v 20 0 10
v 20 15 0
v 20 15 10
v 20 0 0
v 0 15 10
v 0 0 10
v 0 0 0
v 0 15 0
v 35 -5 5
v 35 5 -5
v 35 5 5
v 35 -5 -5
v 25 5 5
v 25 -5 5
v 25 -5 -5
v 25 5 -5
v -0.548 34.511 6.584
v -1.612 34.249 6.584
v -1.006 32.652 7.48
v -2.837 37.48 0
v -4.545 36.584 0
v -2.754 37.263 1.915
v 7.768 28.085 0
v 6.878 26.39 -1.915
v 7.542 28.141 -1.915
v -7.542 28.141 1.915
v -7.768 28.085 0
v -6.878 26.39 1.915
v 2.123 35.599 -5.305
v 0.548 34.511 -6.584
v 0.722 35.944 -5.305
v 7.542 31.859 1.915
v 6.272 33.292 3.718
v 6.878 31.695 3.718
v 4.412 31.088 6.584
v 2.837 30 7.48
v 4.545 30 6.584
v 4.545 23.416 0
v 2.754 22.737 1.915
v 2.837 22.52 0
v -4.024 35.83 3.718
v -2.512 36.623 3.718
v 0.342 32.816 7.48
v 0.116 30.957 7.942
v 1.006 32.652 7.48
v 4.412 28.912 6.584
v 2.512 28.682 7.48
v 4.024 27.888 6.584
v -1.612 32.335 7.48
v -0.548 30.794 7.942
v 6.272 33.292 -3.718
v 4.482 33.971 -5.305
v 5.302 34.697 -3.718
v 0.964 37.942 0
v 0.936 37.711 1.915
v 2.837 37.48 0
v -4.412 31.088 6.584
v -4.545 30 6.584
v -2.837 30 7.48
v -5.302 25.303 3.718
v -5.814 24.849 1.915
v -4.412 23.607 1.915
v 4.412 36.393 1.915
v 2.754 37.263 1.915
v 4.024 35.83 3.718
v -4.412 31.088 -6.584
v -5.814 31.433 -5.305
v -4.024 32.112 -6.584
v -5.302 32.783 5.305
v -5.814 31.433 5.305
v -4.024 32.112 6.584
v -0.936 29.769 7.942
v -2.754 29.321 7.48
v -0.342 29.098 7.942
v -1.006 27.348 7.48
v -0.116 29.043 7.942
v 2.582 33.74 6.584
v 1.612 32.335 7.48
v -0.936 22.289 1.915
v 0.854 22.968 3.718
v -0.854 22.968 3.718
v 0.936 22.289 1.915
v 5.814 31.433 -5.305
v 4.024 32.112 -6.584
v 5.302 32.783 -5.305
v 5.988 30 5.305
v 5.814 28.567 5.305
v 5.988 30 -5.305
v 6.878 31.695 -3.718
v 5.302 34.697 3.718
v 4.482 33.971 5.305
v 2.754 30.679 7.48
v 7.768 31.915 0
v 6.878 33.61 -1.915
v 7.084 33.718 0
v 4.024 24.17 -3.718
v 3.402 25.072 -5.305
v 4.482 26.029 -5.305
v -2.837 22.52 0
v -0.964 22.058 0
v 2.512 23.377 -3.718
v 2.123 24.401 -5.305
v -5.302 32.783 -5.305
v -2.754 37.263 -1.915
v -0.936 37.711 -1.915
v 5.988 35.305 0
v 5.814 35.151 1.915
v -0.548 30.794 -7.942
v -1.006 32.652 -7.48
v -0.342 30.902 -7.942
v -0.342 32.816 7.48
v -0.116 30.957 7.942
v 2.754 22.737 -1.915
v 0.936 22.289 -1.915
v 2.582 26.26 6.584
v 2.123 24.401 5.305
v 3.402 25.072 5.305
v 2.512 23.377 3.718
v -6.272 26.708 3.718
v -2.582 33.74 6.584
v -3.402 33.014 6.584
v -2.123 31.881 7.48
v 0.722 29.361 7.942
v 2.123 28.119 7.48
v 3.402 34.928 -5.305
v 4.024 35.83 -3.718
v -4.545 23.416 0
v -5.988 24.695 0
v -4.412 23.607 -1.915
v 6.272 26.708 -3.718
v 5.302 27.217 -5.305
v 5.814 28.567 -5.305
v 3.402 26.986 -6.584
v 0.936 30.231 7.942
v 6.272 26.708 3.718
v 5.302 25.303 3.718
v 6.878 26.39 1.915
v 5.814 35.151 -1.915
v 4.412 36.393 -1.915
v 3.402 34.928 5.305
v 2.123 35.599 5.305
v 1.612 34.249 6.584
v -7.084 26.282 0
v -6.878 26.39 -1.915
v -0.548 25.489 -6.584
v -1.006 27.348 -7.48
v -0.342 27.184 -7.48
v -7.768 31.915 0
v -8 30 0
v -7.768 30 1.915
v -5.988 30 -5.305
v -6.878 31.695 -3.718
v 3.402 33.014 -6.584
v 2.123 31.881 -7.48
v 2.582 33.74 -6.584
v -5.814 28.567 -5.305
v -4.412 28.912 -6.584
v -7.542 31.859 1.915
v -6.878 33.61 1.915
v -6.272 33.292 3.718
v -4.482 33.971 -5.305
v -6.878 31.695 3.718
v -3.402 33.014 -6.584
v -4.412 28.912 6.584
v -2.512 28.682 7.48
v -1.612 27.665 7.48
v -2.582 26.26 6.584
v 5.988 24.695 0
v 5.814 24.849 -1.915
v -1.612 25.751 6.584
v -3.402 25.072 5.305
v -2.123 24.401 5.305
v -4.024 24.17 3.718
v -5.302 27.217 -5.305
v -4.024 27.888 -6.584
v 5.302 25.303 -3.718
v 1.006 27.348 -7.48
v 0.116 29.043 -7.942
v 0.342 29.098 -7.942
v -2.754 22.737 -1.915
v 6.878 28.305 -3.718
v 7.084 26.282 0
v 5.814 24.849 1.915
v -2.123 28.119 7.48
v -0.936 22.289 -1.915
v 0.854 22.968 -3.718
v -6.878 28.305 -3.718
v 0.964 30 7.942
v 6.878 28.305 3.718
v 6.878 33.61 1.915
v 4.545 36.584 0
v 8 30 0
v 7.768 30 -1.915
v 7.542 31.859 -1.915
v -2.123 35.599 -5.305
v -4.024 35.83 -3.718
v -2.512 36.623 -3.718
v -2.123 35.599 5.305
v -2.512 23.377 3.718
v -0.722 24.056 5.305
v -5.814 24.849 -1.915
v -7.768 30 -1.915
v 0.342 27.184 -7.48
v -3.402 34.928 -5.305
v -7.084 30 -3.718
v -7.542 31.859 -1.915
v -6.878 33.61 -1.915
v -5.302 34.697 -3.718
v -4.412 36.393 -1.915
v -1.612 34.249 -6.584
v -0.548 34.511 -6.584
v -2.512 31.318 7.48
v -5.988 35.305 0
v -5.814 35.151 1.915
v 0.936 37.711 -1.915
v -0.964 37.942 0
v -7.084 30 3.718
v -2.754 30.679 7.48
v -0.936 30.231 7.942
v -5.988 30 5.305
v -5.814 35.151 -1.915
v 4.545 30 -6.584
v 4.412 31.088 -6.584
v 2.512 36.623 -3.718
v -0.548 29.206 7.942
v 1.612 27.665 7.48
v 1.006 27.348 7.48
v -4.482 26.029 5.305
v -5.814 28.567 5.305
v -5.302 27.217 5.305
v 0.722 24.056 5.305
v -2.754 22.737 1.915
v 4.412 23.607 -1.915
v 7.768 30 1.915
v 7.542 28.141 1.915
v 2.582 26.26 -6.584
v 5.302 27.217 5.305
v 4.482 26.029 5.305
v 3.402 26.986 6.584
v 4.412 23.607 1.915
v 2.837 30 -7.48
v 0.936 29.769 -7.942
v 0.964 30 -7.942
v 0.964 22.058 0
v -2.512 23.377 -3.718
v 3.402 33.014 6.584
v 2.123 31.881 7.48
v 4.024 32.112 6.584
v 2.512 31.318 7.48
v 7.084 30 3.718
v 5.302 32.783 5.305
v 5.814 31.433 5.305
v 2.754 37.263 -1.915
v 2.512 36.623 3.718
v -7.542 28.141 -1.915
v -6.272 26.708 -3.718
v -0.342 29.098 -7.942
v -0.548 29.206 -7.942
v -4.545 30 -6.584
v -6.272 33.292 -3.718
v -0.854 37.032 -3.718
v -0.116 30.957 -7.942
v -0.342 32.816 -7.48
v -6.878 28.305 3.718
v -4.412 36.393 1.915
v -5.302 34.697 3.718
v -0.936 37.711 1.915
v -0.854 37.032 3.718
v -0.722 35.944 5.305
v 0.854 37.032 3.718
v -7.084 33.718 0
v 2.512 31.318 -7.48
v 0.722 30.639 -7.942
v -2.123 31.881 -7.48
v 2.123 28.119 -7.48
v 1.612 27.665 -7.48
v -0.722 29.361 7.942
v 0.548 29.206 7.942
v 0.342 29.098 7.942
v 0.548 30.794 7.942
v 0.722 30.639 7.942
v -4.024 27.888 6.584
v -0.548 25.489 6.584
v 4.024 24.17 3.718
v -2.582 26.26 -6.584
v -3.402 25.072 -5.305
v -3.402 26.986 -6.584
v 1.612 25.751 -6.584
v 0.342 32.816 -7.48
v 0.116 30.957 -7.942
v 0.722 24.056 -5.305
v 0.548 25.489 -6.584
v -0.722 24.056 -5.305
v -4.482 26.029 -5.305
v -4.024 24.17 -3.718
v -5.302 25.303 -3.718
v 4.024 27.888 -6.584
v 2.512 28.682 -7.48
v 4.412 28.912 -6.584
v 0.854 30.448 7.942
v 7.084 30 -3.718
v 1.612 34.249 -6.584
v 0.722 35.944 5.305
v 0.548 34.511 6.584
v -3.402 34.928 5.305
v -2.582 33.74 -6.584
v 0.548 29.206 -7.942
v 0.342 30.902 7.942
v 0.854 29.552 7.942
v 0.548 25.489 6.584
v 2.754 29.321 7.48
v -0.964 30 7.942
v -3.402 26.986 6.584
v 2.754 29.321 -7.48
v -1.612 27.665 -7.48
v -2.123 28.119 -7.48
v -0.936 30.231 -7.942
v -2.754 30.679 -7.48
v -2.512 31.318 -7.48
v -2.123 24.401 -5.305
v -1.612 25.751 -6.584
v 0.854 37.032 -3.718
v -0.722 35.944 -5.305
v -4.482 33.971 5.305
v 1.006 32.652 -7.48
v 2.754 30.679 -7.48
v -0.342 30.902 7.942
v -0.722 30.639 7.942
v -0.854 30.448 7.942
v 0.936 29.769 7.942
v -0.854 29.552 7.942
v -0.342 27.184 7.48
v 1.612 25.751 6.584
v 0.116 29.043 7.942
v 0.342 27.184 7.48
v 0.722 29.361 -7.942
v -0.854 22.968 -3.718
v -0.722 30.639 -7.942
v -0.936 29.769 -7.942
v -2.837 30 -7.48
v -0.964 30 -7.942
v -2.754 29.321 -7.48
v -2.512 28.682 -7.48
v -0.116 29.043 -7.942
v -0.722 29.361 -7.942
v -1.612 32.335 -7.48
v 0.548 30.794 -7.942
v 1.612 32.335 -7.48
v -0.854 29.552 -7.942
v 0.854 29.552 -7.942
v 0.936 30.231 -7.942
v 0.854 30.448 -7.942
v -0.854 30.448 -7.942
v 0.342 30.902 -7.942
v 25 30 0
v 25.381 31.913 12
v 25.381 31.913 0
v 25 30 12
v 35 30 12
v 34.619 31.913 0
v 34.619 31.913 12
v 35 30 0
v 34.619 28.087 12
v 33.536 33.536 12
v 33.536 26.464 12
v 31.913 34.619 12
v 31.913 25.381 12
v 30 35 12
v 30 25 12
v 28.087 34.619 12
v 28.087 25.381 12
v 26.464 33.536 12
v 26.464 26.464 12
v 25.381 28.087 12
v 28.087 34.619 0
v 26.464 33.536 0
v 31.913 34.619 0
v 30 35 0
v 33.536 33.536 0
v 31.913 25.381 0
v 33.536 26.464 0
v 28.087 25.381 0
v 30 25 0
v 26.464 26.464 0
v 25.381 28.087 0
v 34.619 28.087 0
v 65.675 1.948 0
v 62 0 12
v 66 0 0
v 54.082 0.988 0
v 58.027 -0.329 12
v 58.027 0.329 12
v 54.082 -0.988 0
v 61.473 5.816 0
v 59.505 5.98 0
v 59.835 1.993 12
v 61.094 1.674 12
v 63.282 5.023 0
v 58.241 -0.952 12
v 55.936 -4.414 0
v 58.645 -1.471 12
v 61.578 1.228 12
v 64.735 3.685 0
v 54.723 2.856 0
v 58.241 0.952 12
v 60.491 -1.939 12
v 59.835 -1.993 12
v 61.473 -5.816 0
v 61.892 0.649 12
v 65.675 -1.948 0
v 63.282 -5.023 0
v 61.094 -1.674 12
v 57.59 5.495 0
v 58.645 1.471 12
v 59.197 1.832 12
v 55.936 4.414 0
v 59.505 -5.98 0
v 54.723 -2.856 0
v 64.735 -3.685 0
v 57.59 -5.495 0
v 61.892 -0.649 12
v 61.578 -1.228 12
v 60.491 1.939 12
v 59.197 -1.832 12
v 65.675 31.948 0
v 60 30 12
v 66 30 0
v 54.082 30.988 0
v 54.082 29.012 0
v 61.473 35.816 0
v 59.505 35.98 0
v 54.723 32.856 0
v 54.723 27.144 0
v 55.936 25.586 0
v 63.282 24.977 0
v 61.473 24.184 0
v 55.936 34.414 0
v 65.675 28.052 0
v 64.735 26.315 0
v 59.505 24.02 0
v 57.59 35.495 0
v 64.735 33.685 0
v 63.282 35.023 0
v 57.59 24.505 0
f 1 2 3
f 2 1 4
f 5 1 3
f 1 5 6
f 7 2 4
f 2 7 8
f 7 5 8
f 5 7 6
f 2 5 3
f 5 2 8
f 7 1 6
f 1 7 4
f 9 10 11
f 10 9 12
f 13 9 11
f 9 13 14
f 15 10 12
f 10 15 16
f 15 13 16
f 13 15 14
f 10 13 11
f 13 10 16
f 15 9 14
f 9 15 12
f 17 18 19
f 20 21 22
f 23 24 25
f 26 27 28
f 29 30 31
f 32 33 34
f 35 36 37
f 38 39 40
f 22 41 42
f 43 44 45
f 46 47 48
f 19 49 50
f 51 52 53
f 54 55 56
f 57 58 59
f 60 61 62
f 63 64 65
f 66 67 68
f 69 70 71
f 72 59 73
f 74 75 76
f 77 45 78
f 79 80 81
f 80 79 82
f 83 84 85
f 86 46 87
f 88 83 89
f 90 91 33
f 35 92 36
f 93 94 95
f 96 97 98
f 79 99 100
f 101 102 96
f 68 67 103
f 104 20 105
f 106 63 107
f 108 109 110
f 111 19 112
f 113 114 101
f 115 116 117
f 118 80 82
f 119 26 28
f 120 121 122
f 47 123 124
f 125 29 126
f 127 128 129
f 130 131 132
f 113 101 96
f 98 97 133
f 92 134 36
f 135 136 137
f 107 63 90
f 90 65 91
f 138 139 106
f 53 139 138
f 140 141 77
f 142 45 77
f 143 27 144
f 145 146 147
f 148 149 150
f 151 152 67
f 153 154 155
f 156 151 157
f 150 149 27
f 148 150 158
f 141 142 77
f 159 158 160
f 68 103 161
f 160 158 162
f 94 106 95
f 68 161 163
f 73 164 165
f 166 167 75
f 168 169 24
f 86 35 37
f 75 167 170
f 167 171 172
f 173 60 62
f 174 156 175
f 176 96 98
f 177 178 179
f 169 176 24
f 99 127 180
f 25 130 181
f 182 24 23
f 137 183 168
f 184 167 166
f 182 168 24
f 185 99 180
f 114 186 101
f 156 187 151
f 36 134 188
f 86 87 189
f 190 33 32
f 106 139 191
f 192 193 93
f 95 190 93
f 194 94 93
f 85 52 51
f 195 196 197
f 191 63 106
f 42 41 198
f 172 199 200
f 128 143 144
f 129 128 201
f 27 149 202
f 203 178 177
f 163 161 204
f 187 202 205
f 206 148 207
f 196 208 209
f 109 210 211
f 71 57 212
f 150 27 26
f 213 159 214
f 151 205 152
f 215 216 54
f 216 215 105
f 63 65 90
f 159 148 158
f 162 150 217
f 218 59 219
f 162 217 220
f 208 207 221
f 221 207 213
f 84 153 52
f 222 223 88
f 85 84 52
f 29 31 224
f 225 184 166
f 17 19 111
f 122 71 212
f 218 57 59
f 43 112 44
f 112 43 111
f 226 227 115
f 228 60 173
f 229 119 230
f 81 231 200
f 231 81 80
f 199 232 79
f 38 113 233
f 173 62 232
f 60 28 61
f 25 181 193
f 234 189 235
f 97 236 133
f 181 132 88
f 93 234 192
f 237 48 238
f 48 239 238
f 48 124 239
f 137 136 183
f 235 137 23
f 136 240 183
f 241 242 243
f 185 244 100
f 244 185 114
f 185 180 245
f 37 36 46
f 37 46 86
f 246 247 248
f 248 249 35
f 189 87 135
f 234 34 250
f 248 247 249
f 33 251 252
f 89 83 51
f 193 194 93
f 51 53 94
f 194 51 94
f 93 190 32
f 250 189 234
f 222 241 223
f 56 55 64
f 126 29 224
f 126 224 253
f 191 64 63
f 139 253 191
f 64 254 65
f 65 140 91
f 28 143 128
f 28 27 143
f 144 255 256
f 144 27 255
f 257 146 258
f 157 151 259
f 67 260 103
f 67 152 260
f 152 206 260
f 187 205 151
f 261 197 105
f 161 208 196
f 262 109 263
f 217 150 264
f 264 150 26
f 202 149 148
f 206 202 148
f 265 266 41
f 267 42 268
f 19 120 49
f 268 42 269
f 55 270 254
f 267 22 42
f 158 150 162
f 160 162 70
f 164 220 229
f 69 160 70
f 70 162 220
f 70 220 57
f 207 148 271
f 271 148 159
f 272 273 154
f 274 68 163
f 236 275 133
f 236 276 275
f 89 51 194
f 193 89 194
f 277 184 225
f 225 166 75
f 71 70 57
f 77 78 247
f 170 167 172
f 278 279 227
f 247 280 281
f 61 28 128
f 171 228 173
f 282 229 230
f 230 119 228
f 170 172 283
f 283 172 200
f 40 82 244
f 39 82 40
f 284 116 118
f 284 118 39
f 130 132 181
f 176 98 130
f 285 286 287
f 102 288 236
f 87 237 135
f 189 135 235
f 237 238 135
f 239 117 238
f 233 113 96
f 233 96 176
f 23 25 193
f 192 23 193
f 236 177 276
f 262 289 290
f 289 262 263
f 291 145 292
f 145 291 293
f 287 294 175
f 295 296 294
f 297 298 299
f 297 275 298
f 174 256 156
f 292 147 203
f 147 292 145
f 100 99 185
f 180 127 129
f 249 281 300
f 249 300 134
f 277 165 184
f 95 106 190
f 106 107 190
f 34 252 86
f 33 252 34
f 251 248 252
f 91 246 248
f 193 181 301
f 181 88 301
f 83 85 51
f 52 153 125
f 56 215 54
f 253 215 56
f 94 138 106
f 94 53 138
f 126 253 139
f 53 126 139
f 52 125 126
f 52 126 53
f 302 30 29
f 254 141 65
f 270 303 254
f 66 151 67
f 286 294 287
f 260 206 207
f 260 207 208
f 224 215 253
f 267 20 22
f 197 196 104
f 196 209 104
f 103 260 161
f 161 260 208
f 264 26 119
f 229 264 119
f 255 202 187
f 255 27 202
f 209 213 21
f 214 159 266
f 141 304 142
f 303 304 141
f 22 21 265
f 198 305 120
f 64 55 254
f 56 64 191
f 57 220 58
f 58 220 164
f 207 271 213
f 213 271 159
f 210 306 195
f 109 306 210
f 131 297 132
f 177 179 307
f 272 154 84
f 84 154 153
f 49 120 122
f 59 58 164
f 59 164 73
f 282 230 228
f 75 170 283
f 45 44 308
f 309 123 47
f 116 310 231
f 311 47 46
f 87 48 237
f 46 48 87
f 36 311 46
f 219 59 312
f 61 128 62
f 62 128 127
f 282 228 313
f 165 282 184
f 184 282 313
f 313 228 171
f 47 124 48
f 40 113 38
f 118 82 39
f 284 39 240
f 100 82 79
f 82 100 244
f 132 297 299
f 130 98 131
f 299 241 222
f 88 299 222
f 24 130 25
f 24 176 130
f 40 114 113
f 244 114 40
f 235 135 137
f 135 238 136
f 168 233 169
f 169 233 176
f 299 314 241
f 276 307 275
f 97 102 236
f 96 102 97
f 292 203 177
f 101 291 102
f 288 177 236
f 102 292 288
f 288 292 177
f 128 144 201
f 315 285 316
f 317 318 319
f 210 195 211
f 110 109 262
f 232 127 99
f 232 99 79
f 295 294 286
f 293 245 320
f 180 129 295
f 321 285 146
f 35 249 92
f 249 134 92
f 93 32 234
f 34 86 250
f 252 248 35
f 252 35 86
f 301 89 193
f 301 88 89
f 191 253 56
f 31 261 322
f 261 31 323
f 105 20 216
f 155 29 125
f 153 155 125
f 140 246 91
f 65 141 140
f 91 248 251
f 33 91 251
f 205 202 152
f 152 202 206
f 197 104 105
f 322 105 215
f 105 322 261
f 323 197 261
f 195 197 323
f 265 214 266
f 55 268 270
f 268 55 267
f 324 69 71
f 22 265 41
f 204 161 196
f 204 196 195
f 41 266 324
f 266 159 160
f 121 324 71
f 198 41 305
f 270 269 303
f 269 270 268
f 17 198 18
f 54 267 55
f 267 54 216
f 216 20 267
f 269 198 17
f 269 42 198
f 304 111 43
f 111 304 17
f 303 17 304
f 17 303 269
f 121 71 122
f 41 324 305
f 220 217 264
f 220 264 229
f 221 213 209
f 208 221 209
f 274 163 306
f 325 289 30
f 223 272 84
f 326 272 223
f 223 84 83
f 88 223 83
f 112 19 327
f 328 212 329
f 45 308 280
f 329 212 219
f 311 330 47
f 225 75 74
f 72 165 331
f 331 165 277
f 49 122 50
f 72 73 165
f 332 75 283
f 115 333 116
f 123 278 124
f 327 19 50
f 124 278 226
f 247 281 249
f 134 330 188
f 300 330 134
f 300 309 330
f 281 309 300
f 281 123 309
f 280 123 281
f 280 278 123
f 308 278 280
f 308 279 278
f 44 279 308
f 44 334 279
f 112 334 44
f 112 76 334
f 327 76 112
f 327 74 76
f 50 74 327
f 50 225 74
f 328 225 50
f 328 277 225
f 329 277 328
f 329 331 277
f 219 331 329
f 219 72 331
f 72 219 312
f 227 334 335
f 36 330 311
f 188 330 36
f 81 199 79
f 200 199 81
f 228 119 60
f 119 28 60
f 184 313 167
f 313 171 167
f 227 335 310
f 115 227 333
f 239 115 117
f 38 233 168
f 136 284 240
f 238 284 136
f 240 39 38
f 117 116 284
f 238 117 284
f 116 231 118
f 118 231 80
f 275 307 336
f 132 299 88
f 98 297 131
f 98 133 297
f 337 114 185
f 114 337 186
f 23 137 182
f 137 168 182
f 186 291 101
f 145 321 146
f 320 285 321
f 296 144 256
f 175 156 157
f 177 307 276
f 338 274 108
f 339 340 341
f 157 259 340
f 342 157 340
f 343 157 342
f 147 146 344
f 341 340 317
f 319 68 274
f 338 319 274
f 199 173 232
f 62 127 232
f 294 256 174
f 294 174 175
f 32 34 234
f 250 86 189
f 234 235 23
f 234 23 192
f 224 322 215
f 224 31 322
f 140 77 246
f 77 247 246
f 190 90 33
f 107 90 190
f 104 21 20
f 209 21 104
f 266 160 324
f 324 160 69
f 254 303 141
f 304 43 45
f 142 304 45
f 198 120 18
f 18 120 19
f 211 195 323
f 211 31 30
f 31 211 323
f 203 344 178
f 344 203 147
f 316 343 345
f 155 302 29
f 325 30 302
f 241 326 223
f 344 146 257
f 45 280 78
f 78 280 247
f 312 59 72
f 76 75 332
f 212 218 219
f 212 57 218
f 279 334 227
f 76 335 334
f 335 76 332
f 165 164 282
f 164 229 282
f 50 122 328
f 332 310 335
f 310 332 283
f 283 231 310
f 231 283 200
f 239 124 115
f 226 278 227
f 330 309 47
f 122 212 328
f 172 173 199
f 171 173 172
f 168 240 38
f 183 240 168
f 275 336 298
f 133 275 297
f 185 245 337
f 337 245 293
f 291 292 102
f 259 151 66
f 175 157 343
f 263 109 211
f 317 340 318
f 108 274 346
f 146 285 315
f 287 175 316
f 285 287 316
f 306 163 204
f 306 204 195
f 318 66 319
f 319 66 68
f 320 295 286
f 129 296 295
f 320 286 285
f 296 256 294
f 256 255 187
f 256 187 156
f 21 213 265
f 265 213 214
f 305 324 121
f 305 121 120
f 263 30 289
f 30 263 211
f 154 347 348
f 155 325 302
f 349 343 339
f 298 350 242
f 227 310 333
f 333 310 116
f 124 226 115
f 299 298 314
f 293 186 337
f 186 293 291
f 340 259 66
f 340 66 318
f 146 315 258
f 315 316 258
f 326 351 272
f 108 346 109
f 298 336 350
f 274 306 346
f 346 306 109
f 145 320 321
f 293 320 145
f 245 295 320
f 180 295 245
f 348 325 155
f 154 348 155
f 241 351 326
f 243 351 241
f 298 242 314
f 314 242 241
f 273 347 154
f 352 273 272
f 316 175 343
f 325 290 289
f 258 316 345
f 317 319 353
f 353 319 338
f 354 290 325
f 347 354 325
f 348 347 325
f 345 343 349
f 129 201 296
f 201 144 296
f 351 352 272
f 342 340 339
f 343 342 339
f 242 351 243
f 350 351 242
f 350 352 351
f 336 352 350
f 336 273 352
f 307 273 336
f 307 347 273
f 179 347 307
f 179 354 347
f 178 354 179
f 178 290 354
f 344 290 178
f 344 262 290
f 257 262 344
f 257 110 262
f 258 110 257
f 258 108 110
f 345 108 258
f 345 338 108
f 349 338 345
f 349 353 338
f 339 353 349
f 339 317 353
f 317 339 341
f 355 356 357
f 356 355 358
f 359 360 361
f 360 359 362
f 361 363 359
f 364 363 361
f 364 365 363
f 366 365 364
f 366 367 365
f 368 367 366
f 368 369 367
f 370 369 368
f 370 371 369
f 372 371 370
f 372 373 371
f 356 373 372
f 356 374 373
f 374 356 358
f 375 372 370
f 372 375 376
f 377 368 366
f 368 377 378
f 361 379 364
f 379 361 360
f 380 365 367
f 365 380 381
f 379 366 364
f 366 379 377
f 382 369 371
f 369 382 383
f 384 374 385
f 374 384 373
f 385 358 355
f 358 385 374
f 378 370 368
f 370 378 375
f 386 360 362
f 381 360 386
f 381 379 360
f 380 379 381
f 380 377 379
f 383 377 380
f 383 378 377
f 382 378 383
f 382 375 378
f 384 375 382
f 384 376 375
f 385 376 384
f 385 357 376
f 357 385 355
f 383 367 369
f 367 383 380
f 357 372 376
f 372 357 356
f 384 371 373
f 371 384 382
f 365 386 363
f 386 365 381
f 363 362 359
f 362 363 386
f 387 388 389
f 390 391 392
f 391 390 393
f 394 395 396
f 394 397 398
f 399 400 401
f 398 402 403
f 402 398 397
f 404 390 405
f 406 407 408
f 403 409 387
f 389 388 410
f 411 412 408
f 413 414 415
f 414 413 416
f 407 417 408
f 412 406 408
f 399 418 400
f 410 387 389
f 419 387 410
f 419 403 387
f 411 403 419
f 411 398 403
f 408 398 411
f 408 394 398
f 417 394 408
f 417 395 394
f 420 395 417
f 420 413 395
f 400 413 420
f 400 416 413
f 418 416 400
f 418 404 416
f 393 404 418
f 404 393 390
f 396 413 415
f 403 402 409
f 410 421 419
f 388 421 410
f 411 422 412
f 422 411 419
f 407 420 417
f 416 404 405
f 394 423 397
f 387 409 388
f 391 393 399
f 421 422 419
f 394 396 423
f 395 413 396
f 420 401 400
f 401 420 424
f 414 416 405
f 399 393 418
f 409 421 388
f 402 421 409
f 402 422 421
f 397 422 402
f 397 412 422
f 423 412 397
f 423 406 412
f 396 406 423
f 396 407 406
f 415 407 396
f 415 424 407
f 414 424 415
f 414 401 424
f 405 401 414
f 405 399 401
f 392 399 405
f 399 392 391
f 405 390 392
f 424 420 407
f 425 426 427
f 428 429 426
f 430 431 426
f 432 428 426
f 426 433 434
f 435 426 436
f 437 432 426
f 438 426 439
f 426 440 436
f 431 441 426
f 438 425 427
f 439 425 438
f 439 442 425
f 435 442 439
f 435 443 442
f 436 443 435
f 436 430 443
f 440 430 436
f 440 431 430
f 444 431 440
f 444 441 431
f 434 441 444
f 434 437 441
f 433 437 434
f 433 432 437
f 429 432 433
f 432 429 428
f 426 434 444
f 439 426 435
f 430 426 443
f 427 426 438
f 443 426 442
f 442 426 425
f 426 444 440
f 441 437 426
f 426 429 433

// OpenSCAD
cube([20, 15, 10]);
translate([30, 0, 0]) cube([10, 10, 10], center = true);
translate([0, 30, 0]) sphere(r = 8);
translate([30, 30, 0]) cylinder(h = 12, r = 5);
translate([60, 0, 0]) cylinder(h = 12, r1 = 6, r2 = 2);
translate([60, 30, 0]) cylinder(h = 12, r1 = 6, r2 = 0);
